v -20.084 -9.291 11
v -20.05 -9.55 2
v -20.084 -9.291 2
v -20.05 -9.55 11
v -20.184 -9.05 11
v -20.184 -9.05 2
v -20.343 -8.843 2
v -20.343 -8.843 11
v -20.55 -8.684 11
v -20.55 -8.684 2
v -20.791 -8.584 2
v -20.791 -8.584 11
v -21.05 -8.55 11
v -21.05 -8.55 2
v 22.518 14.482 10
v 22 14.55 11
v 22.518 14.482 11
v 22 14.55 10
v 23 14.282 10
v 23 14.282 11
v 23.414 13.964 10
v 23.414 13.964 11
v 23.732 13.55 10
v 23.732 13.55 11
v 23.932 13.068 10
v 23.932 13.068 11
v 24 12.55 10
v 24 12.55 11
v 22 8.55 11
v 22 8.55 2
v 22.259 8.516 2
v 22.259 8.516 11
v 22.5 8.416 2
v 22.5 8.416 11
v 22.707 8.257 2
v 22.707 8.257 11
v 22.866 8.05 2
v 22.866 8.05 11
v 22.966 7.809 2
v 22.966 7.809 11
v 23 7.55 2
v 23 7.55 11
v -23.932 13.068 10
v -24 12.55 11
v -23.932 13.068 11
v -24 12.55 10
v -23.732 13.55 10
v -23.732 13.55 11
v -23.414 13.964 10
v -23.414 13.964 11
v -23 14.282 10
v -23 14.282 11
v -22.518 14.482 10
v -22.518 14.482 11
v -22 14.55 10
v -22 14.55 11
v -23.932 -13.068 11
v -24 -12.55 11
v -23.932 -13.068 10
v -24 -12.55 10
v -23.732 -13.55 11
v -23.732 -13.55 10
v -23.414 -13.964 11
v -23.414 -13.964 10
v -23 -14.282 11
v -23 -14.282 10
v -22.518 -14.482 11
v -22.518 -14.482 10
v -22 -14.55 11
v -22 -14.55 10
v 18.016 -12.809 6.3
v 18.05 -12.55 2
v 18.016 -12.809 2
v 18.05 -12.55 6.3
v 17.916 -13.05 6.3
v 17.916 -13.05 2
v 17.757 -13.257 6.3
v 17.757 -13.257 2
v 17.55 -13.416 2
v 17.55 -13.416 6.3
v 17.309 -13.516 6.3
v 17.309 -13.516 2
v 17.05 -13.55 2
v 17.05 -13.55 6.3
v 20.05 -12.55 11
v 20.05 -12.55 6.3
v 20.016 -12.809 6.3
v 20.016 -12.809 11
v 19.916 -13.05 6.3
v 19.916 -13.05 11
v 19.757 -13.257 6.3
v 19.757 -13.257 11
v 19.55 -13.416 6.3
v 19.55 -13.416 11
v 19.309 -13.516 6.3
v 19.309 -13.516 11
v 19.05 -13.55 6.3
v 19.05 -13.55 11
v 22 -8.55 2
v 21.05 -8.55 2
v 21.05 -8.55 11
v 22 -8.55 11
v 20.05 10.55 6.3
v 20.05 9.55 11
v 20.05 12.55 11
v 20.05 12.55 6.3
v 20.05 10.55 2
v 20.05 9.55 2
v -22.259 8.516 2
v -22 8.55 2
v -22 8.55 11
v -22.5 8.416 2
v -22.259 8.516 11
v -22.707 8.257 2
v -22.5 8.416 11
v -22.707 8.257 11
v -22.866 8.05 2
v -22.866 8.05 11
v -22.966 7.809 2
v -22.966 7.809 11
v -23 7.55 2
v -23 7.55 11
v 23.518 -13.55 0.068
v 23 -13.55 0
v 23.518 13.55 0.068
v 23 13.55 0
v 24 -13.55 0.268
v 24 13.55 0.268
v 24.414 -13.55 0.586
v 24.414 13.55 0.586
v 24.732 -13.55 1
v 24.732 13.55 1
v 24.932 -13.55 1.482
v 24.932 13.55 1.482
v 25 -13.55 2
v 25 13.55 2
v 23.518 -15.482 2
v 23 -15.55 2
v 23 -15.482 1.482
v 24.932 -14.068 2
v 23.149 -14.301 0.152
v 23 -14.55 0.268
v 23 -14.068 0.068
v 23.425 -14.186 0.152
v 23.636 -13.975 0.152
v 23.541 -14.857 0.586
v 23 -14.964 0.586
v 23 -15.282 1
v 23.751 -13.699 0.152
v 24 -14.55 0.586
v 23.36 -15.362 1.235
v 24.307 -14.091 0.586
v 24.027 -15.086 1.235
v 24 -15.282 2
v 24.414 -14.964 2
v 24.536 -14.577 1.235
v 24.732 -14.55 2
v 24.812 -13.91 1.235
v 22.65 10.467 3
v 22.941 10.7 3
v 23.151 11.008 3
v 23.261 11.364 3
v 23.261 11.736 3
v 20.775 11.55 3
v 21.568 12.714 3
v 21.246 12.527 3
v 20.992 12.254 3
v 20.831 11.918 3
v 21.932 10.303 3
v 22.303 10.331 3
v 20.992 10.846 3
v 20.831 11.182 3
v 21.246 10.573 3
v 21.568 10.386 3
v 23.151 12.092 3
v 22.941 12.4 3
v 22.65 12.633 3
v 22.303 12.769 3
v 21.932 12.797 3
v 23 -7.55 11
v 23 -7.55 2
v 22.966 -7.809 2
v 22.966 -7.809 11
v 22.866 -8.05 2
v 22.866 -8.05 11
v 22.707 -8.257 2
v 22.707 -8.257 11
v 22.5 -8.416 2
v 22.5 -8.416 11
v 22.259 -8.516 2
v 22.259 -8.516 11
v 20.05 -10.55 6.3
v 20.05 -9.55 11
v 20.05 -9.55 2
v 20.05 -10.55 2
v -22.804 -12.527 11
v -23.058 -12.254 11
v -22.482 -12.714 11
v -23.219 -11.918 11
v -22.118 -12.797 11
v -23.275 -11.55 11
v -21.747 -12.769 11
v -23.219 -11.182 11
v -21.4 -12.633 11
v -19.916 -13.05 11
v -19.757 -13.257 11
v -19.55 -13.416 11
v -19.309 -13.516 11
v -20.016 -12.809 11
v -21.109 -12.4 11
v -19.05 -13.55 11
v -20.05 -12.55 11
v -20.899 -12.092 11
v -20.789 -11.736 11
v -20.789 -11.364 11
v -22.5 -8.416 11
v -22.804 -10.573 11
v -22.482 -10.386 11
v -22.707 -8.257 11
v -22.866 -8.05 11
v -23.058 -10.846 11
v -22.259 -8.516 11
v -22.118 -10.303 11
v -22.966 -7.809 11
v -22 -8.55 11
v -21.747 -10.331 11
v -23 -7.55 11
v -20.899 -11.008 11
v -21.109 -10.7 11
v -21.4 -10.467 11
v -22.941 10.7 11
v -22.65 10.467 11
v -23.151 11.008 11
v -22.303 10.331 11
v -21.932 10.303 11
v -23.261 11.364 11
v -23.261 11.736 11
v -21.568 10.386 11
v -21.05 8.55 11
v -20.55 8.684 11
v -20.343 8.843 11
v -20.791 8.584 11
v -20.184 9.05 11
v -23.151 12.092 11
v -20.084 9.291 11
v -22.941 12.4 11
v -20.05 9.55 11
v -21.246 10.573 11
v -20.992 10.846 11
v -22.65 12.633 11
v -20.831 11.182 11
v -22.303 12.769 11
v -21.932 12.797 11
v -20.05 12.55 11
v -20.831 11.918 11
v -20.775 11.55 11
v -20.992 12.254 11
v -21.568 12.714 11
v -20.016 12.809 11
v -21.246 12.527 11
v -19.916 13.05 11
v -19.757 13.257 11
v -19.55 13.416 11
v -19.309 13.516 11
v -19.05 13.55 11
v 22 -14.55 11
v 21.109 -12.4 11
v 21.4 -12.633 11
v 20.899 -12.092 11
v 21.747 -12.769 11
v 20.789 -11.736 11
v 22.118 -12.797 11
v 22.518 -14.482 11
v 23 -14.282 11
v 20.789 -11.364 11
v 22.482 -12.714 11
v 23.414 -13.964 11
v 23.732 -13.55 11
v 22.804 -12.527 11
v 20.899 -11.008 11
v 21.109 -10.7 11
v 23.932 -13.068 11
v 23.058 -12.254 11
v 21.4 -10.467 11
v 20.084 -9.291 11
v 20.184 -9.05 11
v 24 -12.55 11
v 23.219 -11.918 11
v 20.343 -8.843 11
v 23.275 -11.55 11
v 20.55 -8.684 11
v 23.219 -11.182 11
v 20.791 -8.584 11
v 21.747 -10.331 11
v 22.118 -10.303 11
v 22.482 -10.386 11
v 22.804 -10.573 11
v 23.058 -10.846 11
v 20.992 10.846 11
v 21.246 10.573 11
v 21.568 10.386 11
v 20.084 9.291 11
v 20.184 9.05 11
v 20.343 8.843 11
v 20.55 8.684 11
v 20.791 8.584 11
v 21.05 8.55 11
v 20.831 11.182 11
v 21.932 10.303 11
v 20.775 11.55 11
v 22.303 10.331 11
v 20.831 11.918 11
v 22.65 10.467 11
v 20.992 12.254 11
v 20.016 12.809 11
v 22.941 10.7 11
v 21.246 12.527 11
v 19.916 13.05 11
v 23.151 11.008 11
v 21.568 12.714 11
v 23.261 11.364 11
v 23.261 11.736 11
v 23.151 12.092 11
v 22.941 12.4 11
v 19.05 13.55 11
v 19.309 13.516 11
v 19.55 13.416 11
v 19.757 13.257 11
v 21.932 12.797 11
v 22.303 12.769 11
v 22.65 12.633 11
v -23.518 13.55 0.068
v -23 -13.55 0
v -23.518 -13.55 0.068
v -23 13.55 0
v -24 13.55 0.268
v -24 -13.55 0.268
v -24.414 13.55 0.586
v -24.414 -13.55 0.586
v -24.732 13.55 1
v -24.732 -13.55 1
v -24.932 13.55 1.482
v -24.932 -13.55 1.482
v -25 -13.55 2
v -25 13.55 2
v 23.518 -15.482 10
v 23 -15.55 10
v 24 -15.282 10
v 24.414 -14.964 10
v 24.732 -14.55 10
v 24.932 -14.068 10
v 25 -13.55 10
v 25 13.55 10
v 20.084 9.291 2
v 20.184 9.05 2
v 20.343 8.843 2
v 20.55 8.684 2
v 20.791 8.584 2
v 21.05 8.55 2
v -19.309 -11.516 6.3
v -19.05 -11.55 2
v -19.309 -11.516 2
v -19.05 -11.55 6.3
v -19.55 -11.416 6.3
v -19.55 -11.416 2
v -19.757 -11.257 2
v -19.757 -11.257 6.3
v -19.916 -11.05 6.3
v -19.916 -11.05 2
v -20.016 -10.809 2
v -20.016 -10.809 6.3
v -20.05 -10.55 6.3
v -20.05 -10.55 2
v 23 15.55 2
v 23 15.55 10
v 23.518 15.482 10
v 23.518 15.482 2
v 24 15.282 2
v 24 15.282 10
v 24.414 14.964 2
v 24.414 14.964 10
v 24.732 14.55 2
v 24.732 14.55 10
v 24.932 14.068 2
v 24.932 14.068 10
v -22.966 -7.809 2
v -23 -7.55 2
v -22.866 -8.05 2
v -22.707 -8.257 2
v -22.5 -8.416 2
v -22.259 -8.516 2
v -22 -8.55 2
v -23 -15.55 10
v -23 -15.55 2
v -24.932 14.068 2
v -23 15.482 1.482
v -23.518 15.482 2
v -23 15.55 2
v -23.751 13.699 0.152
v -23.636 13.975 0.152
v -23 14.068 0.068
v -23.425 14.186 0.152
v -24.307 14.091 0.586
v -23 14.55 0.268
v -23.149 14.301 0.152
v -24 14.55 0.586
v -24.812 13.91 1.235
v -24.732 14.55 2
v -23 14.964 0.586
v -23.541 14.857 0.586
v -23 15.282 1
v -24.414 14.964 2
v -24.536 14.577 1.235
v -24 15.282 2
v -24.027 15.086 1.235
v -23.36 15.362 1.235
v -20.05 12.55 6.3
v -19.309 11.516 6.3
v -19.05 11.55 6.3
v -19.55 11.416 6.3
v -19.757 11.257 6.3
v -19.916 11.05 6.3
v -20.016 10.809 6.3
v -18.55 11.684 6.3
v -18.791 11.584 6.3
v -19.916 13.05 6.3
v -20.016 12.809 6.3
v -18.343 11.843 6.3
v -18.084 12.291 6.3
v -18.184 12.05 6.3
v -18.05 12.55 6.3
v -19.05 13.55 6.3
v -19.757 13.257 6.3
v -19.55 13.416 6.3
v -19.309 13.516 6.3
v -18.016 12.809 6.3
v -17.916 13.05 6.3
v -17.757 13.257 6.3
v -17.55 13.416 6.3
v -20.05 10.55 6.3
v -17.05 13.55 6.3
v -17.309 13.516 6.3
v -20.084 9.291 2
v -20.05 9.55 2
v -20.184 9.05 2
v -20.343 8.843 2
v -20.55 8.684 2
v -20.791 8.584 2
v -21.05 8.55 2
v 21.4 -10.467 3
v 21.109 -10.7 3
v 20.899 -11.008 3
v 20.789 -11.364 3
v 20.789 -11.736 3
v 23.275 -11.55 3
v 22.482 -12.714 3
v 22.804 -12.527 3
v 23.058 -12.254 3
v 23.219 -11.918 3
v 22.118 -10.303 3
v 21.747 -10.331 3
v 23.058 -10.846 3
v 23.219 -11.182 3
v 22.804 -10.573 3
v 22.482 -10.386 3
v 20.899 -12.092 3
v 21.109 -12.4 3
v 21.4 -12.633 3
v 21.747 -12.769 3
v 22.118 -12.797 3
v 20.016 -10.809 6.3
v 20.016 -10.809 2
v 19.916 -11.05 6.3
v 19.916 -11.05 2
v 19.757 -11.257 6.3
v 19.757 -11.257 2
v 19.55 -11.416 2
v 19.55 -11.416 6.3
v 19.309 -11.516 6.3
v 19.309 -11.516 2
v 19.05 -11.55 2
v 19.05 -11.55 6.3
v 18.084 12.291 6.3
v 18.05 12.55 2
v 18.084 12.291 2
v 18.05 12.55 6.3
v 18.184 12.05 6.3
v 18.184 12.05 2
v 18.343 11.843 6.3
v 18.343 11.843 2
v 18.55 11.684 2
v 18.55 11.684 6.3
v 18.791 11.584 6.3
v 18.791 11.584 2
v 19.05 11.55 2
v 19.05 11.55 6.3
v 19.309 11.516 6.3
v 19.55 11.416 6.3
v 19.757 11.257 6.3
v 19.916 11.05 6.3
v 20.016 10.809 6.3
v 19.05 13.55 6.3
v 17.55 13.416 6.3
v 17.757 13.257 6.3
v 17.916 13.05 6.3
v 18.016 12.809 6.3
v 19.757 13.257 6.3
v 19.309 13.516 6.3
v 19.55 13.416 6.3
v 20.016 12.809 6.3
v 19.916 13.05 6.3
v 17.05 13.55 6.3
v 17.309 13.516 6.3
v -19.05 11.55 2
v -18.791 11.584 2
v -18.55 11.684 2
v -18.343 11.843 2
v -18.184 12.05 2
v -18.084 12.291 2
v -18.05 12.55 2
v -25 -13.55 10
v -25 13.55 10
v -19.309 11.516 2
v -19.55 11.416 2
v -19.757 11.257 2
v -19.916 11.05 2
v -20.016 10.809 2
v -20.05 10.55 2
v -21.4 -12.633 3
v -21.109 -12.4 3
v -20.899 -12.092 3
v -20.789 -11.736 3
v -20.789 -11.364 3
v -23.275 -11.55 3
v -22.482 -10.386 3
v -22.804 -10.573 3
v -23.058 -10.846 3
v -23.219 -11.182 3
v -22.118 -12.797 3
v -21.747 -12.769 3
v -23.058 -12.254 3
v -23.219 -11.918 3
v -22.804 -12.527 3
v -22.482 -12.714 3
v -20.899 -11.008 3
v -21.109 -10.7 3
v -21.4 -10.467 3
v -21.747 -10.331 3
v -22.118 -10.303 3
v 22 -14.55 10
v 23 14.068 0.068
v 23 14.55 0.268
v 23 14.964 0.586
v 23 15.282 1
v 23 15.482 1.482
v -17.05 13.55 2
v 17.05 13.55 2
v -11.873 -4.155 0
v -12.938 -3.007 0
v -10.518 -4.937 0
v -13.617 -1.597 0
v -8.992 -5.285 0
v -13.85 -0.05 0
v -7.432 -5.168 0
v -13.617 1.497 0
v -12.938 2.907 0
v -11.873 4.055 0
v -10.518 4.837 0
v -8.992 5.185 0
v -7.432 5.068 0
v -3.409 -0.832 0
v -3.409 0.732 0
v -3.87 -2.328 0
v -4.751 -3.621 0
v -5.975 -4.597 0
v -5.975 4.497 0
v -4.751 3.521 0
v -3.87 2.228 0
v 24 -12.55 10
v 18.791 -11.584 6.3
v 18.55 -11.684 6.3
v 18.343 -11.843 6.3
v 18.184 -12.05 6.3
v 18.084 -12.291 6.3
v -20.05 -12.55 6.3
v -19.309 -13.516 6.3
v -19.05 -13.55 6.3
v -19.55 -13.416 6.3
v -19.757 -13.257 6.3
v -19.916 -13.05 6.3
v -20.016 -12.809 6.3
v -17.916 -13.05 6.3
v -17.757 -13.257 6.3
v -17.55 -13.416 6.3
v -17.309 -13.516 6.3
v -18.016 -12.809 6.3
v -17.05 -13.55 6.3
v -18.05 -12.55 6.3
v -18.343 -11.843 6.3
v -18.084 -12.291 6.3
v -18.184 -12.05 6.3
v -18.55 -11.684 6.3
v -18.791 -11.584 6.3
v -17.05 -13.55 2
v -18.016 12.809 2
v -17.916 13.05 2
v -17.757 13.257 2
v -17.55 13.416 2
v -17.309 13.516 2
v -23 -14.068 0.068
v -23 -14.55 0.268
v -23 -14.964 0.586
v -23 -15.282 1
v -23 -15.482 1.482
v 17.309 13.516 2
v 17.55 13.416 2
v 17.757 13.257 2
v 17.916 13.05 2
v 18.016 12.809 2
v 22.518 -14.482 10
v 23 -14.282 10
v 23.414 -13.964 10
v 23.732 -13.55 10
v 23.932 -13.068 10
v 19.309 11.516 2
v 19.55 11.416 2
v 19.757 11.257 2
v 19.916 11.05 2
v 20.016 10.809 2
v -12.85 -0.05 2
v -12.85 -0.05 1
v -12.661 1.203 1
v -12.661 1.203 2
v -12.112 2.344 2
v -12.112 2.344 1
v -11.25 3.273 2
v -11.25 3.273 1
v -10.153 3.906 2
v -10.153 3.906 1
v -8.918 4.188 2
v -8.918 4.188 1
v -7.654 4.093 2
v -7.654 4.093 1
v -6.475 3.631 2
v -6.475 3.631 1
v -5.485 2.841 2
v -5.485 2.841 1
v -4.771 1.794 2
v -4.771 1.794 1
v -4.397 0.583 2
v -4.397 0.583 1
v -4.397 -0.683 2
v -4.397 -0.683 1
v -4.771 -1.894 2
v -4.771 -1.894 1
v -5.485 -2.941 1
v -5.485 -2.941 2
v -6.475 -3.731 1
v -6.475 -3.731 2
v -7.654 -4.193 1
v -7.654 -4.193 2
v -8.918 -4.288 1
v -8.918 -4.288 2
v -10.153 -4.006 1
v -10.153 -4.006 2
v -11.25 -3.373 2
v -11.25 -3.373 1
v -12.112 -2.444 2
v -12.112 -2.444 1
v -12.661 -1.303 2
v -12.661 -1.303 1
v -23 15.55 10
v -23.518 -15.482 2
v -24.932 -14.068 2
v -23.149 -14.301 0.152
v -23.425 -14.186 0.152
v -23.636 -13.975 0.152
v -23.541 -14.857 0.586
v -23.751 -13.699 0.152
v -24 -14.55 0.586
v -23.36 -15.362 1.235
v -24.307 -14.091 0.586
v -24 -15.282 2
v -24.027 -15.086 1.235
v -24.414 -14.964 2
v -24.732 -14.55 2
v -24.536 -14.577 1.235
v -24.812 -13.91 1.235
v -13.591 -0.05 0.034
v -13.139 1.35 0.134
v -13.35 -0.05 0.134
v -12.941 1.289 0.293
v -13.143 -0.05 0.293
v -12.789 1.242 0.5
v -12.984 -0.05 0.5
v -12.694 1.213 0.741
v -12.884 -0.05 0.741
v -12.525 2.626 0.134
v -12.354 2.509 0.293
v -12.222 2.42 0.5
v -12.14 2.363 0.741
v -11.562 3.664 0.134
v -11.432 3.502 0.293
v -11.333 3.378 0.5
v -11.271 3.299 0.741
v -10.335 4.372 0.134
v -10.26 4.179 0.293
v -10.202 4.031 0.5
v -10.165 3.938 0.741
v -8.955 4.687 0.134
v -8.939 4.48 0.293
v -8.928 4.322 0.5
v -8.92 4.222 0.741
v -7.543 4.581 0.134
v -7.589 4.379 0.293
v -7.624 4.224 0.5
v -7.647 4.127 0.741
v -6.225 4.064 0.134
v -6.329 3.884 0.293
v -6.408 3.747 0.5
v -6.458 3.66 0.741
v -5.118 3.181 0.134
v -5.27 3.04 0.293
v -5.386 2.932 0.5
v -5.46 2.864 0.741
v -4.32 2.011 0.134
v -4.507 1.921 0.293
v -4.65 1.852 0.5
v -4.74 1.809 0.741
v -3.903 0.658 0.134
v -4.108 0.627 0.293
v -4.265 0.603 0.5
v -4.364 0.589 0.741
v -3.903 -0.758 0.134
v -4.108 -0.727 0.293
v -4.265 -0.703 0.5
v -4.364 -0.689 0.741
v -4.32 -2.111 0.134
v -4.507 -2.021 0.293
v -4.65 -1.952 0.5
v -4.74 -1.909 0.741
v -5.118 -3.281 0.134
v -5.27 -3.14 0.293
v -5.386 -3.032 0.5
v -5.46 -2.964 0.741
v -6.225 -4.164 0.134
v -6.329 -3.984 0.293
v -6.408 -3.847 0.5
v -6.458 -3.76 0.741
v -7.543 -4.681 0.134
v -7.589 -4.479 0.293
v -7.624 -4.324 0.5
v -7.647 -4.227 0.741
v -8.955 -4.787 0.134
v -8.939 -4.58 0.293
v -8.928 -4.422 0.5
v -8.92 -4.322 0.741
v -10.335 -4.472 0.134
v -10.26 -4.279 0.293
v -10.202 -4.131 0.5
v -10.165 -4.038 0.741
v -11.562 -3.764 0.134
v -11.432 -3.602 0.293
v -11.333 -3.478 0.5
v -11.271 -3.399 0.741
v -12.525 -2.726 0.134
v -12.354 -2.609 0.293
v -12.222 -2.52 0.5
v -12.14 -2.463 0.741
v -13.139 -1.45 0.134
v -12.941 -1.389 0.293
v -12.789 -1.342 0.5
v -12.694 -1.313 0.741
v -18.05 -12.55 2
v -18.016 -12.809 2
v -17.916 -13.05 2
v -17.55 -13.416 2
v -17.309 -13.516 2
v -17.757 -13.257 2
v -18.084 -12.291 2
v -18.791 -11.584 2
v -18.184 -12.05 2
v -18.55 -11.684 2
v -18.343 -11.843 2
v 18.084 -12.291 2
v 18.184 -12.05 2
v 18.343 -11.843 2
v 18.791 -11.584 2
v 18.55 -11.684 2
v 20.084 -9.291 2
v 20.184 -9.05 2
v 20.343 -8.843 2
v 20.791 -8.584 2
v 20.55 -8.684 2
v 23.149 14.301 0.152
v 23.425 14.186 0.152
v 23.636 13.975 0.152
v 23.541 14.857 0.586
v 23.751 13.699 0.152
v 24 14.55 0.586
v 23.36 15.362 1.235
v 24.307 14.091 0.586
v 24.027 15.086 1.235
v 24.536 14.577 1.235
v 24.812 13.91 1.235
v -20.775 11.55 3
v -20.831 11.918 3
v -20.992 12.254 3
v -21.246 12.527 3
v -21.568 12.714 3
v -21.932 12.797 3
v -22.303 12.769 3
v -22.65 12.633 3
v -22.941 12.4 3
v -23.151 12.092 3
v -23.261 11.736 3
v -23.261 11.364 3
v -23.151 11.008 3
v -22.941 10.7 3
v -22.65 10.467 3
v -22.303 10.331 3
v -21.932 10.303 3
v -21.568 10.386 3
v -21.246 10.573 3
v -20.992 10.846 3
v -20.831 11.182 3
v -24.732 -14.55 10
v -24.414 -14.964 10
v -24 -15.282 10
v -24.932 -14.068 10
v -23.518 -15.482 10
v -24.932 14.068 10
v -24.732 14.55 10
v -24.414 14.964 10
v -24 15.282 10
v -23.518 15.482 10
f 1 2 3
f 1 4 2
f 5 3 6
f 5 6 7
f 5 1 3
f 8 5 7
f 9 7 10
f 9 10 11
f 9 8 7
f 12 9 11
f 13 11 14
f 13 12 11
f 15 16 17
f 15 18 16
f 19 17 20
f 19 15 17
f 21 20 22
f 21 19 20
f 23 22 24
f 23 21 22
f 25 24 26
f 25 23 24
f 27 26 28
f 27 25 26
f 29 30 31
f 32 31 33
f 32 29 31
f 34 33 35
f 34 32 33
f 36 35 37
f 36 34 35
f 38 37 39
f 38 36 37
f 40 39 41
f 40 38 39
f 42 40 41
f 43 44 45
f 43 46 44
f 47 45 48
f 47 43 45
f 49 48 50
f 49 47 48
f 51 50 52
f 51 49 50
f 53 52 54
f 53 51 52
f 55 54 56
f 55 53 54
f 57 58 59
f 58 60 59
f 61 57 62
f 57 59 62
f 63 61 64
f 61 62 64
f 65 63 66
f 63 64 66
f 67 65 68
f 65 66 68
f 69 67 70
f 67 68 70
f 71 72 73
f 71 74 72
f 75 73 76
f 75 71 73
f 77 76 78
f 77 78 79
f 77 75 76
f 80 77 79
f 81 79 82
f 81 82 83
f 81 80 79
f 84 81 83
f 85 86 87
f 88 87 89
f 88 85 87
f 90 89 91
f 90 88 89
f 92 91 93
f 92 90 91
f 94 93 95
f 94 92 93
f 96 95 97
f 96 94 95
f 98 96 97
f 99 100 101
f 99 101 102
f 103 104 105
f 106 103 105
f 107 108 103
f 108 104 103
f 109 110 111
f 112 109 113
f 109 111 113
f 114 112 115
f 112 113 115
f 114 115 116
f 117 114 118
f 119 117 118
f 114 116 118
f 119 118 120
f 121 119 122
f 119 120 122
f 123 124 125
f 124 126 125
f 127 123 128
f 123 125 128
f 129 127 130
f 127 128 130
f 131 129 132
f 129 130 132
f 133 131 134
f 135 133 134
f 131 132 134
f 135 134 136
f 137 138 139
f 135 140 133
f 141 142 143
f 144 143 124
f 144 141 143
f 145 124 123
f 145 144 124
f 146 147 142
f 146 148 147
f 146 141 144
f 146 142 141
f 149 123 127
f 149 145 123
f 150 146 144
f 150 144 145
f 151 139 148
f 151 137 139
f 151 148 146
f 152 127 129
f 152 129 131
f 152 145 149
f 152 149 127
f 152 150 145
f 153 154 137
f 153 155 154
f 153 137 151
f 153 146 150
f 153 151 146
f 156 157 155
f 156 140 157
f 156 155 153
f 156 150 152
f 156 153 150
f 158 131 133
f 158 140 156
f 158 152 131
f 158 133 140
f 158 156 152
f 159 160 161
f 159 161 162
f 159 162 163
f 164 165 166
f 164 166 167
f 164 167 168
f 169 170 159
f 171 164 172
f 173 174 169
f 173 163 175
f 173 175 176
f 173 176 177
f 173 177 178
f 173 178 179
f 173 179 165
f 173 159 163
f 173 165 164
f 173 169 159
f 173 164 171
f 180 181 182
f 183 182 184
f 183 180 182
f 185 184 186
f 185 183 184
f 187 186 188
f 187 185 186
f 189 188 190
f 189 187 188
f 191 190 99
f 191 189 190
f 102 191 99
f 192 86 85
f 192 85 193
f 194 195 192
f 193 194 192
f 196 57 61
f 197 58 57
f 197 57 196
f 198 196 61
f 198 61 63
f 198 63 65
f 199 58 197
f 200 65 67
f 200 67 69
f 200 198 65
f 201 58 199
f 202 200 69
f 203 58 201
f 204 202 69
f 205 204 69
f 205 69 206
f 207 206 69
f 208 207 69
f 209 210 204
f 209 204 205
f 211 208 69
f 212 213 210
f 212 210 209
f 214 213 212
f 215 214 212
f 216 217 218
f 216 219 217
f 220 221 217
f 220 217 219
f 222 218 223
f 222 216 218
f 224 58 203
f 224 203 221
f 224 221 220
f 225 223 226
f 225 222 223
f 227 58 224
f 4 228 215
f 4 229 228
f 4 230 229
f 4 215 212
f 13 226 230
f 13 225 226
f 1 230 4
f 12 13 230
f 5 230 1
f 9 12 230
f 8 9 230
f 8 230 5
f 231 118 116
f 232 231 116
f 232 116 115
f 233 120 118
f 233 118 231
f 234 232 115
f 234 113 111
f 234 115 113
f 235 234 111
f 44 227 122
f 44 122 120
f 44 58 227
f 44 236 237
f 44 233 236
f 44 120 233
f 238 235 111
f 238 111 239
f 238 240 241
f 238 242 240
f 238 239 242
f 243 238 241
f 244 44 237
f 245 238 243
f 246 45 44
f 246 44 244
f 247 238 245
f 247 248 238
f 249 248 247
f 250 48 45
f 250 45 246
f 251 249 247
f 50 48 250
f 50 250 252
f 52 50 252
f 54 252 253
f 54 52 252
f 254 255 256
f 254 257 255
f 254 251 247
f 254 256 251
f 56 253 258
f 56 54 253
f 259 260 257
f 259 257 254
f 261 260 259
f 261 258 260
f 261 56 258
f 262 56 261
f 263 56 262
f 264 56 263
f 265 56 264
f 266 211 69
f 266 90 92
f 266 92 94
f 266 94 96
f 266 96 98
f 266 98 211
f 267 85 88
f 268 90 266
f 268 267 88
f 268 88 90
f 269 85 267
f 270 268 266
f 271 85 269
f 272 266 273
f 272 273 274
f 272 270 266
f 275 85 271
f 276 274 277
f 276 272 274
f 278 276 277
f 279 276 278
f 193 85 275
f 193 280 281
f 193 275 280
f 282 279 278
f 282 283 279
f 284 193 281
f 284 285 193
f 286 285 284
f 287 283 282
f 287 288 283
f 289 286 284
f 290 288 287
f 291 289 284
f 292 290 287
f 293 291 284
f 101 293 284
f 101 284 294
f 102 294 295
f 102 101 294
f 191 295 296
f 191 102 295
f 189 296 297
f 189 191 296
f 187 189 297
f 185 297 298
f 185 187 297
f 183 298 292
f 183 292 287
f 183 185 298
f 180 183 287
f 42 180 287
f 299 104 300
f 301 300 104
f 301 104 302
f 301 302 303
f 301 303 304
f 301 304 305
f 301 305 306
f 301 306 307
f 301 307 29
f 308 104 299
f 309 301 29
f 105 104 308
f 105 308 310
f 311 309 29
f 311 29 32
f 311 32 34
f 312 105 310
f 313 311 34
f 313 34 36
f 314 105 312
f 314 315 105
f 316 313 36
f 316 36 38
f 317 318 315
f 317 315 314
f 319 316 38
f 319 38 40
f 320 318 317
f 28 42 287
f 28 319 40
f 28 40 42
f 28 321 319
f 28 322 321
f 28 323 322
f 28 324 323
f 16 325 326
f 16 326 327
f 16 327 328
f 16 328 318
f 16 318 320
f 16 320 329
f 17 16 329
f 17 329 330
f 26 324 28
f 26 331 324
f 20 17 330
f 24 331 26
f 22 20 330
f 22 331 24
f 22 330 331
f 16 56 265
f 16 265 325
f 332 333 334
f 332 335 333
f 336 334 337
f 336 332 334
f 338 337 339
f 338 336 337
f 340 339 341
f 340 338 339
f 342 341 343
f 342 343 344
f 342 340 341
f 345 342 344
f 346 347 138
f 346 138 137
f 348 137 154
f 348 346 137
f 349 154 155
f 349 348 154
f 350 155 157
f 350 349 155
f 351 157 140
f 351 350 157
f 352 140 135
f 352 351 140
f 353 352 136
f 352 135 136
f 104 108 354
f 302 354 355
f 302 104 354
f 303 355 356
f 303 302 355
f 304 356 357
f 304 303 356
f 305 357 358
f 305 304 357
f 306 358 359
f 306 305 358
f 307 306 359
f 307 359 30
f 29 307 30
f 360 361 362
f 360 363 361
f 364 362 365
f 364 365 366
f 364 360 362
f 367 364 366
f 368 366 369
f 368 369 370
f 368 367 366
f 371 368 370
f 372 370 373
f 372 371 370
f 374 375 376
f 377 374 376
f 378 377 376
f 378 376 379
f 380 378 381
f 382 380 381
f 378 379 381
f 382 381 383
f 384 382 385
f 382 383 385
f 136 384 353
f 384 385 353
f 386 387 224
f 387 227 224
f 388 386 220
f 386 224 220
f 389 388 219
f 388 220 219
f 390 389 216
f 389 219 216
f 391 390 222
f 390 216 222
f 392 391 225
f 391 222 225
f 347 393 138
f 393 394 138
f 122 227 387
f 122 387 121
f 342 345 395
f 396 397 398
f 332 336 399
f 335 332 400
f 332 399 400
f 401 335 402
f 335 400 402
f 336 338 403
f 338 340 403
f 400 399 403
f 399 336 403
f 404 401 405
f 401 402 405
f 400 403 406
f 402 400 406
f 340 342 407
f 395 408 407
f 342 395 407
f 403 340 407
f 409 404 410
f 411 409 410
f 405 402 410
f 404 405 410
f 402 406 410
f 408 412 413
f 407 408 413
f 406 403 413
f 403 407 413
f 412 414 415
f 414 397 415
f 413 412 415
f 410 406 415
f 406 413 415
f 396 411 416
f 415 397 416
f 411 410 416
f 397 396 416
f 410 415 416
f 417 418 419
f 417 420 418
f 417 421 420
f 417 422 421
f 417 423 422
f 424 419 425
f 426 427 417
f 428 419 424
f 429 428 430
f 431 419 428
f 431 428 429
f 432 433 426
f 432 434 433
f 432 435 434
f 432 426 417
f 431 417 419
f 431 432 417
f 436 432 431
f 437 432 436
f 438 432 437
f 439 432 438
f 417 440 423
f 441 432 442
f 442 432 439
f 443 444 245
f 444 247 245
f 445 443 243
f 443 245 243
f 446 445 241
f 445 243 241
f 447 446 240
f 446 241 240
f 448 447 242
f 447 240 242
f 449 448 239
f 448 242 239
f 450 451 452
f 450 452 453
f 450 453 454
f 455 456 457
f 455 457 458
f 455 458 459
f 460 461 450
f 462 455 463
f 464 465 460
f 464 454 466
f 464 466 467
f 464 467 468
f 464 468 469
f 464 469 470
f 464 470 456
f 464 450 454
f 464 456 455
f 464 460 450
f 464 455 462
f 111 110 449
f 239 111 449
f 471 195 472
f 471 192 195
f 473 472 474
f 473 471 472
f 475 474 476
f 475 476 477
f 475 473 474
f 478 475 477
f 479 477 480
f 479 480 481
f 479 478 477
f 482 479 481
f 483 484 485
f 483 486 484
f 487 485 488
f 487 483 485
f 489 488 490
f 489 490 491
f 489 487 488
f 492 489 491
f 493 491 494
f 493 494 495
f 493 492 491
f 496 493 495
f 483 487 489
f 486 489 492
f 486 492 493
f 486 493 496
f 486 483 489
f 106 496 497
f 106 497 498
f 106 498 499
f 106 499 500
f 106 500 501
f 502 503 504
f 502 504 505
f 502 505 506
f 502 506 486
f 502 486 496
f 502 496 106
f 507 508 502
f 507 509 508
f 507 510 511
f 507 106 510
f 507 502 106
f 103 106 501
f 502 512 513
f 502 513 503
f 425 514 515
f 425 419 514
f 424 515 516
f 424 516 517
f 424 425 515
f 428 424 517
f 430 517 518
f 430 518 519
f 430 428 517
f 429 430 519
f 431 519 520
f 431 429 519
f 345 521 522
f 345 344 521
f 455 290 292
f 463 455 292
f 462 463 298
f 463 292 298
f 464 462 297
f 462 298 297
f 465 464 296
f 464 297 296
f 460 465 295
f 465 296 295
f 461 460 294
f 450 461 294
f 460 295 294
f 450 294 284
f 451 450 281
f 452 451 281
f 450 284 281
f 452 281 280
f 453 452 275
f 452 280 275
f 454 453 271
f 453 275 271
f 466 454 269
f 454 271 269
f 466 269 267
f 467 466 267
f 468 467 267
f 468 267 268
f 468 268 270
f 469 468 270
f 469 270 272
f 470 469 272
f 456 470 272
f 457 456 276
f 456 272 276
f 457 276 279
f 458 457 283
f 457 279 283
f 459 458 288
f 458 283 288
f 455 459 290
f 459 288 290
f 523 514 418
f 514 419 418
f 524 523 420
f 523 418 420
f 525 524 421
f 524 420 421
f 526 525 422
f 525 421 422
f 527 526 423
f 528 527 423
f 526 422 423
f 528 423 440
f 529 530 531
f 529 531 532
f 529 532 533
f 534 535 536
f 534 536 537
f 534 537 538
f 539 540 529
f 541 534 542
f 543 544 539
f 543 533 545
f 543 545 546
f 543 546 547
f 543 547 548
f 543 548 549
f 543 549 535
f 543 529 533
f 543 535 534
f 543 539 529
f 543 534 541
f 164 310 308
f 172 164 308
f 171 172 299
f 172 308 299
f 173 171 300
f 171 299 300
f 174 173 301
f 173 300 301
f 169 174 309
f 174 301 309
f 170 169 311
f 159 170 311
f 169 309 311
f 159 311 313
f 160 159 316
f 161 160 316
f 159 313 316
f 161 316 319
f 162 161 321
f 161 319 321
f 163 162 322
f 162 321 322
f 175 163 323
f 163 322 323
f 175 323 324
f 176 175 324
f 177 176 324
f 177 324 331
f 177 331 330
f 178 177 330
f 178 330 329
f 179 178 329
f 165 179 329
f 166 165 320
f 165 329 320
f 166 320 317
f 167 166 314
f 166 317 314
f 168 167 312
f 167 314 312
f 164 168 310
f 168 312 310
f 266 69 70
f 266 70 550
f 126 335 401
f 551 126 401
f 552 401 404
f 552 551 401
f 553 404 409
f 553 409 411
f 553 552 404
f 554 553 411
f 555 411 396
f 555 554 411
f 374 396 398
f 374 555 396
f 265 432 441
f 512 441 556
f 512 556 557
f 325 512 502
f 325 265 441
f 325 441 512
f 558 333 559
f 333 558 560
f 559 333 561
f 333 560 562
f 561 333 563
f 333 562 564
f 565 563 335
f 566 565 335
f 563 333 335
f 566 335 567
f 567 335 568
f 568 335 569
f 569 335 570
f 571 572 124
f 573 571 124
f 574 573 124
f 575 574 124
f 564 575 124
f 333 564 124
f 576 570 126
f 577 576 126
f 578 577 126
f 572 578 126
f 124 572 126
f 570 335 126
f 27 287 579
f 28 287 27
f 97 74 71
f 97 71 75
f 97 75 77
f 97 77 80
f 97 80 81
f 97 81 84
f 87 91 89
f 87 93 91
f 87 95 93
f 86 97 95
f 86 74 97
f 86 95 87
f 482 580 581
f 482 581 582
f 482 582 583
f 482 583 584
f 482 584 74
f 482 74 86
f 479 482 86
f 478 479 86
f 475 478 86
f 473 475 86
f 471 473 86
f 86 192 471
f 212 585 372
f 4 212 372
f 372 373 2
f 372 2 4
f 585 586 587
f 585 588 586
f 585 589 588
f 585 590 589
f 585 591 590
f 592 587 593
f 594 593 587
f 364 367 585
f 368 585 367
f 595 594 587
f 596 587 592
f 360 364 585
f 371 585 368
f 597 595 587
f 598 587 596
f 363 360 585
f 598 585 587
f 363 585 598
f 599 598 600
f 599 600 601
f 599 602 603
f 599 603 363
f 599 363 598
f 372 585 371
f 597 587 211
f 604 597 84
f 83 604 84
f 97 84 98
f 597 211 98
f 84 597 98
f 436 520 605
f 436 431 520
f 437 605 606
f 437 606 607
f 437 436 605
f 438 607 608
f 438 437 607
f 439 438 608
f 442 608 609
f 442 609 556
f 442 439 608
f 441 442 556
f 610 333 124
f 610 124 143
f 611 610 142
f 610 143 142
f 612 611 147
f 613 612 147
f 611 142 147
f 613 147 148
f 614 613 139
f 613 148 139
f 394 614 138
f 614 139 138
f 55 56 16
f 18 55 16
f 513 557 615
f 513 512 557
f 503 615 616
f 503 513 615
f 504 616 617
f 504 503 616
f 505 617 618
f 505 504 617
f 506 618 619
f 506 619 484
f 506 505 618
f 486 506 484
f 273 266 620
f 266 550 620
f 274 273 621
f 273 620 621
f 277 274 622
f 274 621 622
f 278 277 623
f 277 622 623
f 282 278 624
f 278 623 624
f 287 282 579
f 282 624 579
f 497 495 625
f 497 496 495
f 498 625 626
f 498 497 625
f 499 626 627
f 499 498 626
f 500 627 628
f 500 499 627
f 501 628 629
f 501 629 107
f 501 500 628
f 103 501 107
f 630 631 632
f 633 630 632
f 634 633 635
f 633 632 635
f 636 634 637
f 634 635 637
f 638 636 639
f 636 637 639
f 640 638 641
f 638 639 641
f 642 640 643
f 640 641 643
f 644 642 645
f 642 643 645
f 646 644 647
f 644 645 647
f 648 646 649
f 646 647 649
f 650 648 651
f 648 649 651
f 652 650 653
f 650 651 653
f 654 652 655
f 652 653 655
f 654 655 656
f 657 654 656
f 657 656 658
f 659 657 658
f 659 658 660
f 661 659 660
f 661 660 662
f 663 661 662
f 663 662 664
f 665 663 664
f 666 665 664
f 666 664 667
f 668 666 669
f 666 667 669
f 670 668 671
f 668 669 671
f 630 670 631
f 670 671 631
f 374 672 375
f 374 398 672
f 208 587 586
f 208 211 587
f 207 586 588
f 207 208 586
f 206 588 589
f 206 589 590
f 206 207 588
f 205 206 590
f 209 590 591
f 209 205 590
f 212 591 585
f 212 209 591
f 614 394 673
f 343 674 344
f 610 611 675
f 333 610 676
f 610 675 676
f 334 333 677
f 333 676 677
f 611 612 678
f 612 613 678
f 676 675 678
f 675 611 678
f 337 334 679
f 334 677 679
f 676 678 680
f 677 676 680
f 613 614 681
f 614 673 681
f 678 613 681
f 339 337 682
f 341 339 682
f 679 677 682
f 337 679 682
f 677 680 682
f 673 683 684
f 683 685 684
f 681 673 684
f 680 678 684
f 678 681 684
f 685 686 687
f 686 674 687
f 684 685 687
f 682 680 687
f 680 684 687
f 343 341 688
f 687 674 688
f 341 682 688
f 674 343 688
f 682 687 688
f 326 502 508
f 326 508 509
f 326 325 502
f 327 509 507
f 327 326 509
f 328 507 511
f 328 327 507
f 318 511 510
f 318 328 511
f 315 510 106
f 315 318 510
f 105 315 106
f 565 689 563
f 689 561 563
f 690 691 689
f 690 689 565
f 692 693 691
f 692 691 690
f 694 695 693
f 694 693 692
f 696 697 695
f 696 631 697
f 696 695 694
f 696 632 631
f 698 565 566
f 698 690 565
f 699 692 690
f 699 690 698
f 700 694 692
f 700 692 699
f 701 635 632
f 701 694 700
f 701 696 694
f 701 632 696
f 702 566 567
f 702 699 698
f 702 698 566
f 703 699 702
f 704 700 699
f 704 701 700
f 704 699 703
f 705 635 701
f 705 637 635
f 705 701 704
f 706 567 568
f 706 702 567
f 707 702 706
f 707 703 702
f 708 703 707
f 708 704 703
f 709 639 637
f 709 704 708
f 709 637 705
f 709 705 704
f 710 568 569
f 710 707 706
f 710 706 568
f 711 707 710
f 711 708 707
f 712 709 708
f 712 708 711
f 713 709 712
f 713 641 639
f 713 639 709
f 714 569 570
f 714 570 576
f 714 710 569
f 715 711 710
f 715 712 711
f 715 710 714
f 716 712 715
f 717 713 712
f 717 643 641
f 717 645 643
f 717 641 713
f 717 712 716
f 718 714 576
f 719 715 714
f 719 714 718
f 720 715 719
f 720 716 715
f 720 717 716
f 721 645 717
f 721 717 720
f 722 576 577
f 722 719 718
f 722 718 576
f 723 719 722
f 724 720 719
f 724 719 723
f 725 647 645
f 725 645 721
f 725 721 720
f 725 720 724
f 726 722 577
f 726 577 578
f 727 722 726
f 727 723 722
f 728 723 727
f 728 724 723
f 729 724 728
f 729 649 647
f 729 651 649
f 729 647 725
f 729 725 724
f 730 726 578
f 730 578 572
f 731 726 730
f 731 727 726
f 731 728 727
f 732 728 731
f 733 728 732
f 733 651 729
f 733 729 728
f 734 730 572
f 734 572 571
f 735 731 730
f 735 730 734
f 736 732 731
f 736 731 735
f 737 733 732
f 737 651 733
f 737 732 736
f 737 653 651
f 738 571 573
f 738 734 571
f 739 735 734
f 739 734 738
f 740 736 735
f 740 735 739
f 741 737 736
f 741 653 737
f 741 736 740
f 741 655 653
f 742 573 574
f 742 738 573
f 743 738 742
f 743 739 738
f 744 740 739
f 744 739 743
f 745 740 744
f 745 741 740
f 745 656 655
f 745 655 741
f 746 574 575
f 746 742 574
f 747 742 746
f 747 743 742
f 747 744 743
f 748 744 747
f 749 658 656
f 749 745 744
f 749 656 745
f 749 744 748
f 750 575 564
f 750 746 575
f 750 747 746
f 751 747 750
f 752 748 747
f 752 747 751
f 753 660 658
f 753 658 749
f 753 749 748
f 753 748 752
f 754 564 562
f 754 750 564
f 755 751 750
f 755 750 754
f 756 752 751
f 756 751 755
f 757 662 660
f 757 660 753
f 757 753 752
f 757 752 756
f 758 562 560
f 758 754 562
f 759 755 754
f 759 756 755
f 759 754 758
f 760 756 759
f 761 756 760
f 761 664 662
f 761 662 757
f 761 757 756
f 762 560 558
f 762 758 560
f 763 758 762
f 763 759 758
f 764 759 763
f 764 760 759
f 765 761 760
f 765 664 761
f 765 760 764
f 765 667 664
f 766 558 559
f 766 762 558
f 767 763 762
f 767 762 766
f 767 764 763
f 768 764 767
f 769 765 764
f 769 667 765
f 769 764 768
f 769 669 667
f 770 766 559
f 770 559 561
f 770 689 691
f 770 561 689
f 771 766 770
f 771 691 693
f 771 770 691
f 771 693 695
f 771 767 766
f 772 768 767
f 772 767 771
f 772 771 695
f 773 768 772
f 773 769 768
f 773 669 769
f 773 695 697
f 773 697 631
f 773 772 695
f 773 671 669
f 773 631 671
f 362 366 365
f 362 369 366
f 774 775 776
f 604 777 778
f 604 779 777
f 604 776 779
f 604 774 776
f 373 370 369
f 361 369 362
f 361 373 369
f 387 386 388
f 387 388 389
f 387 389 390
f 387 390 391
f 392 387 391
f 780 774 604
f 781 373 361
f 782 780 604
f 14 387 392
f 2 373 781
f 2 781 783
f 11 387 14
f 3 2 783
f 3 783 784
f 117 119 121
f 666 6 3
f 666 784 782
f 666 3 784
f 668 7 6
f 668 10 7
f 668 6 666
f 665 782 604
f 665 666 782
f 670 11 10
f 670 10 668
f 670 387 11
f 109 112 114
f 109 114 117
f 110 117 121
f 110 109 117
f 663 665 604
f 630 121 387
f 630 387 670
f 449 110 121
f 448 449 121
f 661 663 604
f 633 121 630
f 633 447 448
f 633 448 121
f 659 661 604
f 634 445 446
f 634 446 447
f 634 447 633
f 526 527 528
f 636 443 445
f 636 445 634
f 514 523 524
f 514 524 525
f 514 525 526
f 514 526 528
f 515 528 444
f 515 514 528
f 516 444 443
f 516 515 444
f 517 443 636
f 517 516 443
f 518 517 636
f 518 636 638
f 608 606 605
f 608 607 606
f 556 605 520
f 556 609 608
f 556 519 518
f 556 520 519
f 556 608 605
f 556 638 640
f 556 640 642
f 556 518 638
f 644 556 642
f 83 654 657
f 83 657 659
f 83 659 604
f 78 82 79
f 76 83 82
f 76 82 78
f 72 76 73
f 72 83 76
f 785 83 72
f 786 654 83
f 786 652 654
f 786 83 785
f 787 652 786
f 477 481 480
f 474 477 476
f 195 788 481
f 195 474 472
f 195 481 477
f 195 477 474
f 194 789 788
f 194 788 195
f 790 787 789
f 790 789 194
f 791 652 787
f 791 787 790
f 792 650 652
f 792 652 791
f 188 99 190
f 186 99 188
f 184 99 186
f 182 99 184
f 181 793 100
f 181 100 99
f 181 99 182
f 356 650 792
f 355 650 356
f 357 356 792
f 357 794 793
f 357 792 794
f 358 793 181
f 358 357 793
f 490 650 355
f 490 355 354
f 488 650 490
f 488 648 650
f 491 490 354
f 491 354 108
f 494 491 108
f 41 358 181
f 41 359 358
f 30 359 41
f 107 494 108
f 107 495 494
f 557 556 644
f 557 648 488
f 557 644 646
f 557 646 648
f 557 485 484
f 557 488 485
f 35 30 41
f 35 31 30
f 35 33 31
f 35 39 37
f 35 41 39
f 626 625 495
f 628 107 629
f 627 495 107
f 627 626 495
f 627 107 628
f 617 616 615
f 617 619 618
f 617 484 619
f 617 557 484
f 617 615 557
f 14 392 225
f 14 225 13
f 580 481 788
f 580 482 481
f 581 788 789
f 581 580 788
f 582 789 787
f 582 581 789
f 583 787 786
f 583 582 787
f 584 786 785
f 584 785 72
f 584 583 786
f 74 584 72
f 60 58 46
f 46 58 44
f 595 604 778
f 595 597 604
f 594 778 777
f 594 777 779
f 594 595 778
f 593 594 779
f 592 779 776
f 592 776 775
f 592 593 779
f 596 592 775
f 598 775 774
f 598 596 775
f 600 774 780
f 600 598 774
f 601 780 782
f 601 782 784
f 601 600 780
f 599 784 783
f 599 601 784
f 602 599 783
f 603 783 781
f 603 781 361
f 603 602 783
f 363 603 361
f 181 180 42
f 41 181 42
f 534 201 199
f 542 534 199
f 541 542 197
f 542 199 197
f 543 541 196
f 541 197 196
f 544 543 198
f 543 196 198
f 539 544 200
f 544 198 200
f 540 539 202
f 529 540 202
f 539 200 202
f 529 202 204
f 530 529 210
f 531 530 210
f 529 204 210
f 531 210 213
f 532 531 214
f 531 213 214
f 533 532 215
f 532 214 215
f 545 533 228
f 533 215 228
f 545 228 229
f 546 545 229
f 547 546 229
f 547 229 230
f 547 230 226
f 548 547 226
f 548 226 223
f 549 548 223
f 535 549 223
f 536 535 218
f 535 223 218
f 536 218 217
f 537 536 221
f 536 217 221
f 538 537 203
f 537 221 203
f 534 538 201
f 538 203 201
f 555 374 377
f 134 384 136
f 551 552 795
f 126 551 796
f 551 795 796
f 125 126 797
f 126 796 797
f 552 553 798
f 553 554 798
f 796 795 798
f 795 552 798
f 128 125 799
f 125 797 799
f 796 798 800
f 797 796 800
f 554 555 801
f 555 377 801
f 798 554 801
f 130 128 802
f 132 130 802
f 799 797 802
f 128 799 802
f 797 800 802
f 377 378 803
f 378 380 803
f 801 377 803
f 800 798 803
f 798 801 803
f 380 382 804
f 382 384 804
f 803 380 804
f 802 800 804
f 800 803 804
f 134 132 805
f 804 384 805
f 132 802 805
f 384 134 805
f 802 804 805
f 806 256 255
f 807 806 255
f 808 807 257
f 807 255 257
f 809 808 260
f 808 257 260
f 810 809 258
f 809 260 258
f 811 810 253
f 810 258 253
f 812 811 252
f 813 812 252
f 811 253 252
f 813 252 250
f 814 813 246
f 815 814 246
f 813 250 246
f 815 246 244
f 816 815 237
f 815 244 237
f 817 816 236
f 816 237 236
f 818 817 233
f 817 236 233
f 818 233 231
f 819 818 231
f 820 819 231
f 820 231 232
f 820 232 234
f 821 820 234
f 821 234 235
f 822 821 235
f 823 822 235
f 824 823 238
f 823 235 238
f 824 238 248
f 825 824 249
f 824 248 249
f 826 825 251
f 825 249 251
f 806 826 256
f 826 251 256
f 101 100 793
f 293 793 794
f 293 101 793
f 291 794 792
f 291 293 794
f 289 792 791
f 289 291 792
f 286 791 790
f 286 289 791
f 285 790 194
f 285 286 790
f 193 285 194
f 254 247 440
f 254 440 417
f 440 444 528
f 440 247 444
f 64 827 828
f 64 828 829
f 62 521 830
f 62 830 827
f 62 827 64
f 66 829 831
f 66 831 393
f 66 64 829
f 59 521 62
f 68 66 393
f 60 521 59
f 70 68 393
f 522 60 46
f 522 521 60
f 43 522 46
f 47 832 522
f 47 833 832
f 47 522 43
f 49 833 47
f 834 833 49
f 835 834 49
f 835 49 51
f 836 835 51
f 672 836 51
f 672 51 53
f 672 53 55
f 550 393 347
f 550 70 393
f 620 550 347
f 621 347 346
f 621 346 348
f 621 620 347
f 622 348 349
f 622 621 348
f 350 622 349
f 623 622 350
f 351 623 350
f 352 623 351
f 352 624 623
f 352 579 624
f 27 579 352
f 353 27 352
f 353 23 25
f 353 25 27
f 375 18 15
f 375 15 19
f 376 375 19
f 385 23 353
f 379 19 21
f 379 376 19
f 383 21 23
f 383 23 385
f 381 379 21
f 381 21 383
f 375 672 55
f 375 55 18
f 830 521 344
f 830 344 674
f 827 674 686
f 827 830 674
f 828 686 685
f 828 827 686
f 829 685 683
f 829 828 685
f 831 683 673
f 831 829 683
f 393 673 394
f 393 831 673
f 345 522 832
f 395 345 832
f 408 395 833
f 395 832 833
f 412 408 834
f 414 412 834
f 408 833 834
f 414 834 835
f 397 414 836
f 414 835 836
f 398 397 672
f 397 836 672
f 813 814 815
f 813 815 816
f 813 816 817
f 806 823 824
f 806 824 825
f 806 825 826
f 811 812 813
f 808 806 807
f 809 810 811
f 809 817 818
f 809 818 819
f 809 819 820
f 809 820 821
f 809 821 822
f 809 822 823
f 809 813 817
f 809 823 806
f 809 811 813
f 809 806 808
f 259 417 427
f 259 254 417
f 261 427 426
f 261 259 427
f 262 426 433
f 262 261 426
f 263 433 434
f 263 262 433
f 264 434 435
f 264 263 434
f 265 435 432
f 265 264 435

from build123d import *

# Parameters (mm, degrees)
SKETCH1_W           = 50
SKETCH1_H           = 31.1
BOSS_EXTRUDE1_DEPTH = 11
SKETCH2_W           = 46
SKETCH2_H           = 27.1
CUT_EXTRUDE1_DEPTH  = 9
SKETCH3_R           = 4.25
CUT_EXTRUDE2_DEPTH  = 2
FILLET1_R           = 1
SKETCH4_W           = 50
SKETCH4_H           = 31.1
SKETCH4_W_2         = 48
SKETCH4_H_2         = 29.1
CUT_EXTRUDE3_DEPTH  = 1
SKETCH5_W           = 2.95
SKETCH5_H           = 5
BOSS_EXTRUDE2_DEPTH = 9
SKETCH6_R           = 1.25
CUT_EXTRUDE4_DEPTH  = 8
FILLET2_R           = 2
SKETCH7_W           = 2
SKETCH7_H           = 2
BOSS_EXTRUDE3_DEPTH = 4.3
FILLET3_R           = 1


with BuildPart() as part:
    # Sketch1 → Boss-Extrude1 (new body)
    with BuildSketch(Plane.XY):
        Rectangle(SKETCH1_W, SKETCH1_H)
    extrude(amount=BOSS_EXTRUDE1_DEPTH)

    # Sketch2 → Cut-Extrude1 (cut)
    with BuildSketch(Plane.XY.offset(11)):
        Rectangle(SKETCH2_W, SKETCH2_H)
    extrude(amount=-CUT_EXTRUDE1_DEPTH, mode=Mode.SUBTRACT)

    # Sketch3 → Cut-Extrude2 (cut)
    with BuildSketch(Plane(origin=(0, 0, 0), x_dir=(-1, 0, 0), z_dir=(0, 0, -1))):
        with Locations((8.6, -0.05)):
            Circle(SKETCH3_R)
    extrude(amount=-CUT_EXTRUDE2_DEPTH, mode=Mode.SUBTRACT)

    # Fillet1
    fillet1_edges = [part.edges().sort_by_distance(p)[0] for p in [
        (-4.35, -0.05, 0),
    ]]
    fillet(fillet1_edges, radius=FILLET1_R)

    # Sketch4 → Cut-Extrude3 (cut)
    with BuildSketch(Plane.XY.offset(11)):
        Rectangle(SKETCH4_W, SKETCH4_H)
        Rectangle(SKETCH4_W_2, SKETCH4_H_2, mode=Mode.SUBTRACT)
    extrude(amount=-CUT_EXTRUDE3_DEPTH, mode=Mode.SUBTRACT)

    # Sketch5 → Boss-Extrude2 (add)
    with BuildSketch(Plane.XY.offset(2)):
        with Locations((-21.525, 11.05)):
            Rectangle(SKETCH5_W, SKETCH5_H)
        with Locations((21.525, 11.05)):
            Rectangle(SKETCH5_W, SKETCH5_H)
        with Locations((-21.525, -11.05)):
            Rectangle(SKETCH5_W, SKETCH5_H)
        with Locations((21.525, -11.05)):
            Rectangle(SKETCH5_W, SKETCH5_H)
    extrude(amount=BOSS_EXTRUDE2_DEPTH)

    # Sketch6 → Cut-Extrude4 (cut)
    with BuildSketch(Plane.XY.offset(11)):
        with Locations((-22.025, 11.55)):
            Circle(SKETCH6_R)
        with Locations(Location((22.025, 11.55, 0), (0, 0, 180))):
            Circle(SKETCH6_R)
        with Locations(Location((-22.025, -11.55, 0), (0, 0, 180))):
            Circle(SKETCH6_R)
        with Locations((22.025, -11.55)):
            Circle(SKETCH6_R)
    extrude(amount=-CUT_EXTRUDE4_DEPTH, mode=Mode.SUBTRACT)

    # Fillet2
    fillet2_edges = [part.edges().sort_by_distance(p)[0] for p in [
        (25, -15.55, 5),
        (-25, -15.55, 5),
        (-25, 15.55, 5),
        (25, 15.55, 5),
        (24, -14.55, 10.5),
        (0, -15.55, 0),
        (-24, -14.55, 10.5),
        (-24, 14.55, 10.5),
        (24, 14.55, 10.5),
        (-25, 0, 0),
        (0, 15.55, 0),
        (25, 0, 0),
    ]]
    fillet(fillet2_edges, radius=FILLET2_R)

    # Sketch7 → Boss-Extrude3 (add)
    with BuildSketch(Plane.XY.offset(2)):
        with Locations((-19.05, 12.55)):
            Rectangle(SKETCH7_W, SKETCH7_H)
        with Locations((19.05, 12.55)):
            Rectangle(SKETCH7_W, SKETCH7_H)
        with Locations((19.05, -12.55)):
            Rectangle(SKETCH7_W, SKETCH7_H)
        with Locations((-19.05, -12.55)):
            Rectangle(SKETCH7_W, SKETCH7_H)
    extrude(amount=BOSS_EXTRUDE3_DEPTH)

    # Fillet3
    fillet3_edges = [part.edges().sort_by_distance(p)[0] for p in [
        (23, 8.55, 6.5),
        (20.05, 8.55, 6.5),
        (20.05, 13.55, 8.65),
        (-20.05, 13.55, 8.65),
        (-23, 8.55, 6.5),
        (-23, -8.55, 6.5),
        (-20.05, -8.55, 6.5),
        (-20.05, -13.55, 8.65),
        (20.05, -13.55, 8.65),
        (20.05, -8.55, 6.5),
        (23, -8.55, 6.5),
        (-20.05, 8.55, 6.5),
        (-18.05, -11.55, 4.15),
        (-20.05, -11.55, 4.15),
        (-18.05, 11.55, 4.15),
        (-18.05, 13.55, 4.15),
        (18.05, 13.55, 4.15),
        (18.05, 11.55, 4.15),
        (20.05, 11.55, 4.15),
        (20.05, -11.55, 4.15),
        (18.05, -11.55, 4.15),
        (18.05, -13.55, 4.15),
        (-18.05, -13.55, 4.15),
        (-20.05, 11.55, 4.15),
    ]]
    fillet(fillet3_edges, radius=FILLET3_R - 0.0001)  # a hair under: the kernel refuses the full size


solid = part.part
